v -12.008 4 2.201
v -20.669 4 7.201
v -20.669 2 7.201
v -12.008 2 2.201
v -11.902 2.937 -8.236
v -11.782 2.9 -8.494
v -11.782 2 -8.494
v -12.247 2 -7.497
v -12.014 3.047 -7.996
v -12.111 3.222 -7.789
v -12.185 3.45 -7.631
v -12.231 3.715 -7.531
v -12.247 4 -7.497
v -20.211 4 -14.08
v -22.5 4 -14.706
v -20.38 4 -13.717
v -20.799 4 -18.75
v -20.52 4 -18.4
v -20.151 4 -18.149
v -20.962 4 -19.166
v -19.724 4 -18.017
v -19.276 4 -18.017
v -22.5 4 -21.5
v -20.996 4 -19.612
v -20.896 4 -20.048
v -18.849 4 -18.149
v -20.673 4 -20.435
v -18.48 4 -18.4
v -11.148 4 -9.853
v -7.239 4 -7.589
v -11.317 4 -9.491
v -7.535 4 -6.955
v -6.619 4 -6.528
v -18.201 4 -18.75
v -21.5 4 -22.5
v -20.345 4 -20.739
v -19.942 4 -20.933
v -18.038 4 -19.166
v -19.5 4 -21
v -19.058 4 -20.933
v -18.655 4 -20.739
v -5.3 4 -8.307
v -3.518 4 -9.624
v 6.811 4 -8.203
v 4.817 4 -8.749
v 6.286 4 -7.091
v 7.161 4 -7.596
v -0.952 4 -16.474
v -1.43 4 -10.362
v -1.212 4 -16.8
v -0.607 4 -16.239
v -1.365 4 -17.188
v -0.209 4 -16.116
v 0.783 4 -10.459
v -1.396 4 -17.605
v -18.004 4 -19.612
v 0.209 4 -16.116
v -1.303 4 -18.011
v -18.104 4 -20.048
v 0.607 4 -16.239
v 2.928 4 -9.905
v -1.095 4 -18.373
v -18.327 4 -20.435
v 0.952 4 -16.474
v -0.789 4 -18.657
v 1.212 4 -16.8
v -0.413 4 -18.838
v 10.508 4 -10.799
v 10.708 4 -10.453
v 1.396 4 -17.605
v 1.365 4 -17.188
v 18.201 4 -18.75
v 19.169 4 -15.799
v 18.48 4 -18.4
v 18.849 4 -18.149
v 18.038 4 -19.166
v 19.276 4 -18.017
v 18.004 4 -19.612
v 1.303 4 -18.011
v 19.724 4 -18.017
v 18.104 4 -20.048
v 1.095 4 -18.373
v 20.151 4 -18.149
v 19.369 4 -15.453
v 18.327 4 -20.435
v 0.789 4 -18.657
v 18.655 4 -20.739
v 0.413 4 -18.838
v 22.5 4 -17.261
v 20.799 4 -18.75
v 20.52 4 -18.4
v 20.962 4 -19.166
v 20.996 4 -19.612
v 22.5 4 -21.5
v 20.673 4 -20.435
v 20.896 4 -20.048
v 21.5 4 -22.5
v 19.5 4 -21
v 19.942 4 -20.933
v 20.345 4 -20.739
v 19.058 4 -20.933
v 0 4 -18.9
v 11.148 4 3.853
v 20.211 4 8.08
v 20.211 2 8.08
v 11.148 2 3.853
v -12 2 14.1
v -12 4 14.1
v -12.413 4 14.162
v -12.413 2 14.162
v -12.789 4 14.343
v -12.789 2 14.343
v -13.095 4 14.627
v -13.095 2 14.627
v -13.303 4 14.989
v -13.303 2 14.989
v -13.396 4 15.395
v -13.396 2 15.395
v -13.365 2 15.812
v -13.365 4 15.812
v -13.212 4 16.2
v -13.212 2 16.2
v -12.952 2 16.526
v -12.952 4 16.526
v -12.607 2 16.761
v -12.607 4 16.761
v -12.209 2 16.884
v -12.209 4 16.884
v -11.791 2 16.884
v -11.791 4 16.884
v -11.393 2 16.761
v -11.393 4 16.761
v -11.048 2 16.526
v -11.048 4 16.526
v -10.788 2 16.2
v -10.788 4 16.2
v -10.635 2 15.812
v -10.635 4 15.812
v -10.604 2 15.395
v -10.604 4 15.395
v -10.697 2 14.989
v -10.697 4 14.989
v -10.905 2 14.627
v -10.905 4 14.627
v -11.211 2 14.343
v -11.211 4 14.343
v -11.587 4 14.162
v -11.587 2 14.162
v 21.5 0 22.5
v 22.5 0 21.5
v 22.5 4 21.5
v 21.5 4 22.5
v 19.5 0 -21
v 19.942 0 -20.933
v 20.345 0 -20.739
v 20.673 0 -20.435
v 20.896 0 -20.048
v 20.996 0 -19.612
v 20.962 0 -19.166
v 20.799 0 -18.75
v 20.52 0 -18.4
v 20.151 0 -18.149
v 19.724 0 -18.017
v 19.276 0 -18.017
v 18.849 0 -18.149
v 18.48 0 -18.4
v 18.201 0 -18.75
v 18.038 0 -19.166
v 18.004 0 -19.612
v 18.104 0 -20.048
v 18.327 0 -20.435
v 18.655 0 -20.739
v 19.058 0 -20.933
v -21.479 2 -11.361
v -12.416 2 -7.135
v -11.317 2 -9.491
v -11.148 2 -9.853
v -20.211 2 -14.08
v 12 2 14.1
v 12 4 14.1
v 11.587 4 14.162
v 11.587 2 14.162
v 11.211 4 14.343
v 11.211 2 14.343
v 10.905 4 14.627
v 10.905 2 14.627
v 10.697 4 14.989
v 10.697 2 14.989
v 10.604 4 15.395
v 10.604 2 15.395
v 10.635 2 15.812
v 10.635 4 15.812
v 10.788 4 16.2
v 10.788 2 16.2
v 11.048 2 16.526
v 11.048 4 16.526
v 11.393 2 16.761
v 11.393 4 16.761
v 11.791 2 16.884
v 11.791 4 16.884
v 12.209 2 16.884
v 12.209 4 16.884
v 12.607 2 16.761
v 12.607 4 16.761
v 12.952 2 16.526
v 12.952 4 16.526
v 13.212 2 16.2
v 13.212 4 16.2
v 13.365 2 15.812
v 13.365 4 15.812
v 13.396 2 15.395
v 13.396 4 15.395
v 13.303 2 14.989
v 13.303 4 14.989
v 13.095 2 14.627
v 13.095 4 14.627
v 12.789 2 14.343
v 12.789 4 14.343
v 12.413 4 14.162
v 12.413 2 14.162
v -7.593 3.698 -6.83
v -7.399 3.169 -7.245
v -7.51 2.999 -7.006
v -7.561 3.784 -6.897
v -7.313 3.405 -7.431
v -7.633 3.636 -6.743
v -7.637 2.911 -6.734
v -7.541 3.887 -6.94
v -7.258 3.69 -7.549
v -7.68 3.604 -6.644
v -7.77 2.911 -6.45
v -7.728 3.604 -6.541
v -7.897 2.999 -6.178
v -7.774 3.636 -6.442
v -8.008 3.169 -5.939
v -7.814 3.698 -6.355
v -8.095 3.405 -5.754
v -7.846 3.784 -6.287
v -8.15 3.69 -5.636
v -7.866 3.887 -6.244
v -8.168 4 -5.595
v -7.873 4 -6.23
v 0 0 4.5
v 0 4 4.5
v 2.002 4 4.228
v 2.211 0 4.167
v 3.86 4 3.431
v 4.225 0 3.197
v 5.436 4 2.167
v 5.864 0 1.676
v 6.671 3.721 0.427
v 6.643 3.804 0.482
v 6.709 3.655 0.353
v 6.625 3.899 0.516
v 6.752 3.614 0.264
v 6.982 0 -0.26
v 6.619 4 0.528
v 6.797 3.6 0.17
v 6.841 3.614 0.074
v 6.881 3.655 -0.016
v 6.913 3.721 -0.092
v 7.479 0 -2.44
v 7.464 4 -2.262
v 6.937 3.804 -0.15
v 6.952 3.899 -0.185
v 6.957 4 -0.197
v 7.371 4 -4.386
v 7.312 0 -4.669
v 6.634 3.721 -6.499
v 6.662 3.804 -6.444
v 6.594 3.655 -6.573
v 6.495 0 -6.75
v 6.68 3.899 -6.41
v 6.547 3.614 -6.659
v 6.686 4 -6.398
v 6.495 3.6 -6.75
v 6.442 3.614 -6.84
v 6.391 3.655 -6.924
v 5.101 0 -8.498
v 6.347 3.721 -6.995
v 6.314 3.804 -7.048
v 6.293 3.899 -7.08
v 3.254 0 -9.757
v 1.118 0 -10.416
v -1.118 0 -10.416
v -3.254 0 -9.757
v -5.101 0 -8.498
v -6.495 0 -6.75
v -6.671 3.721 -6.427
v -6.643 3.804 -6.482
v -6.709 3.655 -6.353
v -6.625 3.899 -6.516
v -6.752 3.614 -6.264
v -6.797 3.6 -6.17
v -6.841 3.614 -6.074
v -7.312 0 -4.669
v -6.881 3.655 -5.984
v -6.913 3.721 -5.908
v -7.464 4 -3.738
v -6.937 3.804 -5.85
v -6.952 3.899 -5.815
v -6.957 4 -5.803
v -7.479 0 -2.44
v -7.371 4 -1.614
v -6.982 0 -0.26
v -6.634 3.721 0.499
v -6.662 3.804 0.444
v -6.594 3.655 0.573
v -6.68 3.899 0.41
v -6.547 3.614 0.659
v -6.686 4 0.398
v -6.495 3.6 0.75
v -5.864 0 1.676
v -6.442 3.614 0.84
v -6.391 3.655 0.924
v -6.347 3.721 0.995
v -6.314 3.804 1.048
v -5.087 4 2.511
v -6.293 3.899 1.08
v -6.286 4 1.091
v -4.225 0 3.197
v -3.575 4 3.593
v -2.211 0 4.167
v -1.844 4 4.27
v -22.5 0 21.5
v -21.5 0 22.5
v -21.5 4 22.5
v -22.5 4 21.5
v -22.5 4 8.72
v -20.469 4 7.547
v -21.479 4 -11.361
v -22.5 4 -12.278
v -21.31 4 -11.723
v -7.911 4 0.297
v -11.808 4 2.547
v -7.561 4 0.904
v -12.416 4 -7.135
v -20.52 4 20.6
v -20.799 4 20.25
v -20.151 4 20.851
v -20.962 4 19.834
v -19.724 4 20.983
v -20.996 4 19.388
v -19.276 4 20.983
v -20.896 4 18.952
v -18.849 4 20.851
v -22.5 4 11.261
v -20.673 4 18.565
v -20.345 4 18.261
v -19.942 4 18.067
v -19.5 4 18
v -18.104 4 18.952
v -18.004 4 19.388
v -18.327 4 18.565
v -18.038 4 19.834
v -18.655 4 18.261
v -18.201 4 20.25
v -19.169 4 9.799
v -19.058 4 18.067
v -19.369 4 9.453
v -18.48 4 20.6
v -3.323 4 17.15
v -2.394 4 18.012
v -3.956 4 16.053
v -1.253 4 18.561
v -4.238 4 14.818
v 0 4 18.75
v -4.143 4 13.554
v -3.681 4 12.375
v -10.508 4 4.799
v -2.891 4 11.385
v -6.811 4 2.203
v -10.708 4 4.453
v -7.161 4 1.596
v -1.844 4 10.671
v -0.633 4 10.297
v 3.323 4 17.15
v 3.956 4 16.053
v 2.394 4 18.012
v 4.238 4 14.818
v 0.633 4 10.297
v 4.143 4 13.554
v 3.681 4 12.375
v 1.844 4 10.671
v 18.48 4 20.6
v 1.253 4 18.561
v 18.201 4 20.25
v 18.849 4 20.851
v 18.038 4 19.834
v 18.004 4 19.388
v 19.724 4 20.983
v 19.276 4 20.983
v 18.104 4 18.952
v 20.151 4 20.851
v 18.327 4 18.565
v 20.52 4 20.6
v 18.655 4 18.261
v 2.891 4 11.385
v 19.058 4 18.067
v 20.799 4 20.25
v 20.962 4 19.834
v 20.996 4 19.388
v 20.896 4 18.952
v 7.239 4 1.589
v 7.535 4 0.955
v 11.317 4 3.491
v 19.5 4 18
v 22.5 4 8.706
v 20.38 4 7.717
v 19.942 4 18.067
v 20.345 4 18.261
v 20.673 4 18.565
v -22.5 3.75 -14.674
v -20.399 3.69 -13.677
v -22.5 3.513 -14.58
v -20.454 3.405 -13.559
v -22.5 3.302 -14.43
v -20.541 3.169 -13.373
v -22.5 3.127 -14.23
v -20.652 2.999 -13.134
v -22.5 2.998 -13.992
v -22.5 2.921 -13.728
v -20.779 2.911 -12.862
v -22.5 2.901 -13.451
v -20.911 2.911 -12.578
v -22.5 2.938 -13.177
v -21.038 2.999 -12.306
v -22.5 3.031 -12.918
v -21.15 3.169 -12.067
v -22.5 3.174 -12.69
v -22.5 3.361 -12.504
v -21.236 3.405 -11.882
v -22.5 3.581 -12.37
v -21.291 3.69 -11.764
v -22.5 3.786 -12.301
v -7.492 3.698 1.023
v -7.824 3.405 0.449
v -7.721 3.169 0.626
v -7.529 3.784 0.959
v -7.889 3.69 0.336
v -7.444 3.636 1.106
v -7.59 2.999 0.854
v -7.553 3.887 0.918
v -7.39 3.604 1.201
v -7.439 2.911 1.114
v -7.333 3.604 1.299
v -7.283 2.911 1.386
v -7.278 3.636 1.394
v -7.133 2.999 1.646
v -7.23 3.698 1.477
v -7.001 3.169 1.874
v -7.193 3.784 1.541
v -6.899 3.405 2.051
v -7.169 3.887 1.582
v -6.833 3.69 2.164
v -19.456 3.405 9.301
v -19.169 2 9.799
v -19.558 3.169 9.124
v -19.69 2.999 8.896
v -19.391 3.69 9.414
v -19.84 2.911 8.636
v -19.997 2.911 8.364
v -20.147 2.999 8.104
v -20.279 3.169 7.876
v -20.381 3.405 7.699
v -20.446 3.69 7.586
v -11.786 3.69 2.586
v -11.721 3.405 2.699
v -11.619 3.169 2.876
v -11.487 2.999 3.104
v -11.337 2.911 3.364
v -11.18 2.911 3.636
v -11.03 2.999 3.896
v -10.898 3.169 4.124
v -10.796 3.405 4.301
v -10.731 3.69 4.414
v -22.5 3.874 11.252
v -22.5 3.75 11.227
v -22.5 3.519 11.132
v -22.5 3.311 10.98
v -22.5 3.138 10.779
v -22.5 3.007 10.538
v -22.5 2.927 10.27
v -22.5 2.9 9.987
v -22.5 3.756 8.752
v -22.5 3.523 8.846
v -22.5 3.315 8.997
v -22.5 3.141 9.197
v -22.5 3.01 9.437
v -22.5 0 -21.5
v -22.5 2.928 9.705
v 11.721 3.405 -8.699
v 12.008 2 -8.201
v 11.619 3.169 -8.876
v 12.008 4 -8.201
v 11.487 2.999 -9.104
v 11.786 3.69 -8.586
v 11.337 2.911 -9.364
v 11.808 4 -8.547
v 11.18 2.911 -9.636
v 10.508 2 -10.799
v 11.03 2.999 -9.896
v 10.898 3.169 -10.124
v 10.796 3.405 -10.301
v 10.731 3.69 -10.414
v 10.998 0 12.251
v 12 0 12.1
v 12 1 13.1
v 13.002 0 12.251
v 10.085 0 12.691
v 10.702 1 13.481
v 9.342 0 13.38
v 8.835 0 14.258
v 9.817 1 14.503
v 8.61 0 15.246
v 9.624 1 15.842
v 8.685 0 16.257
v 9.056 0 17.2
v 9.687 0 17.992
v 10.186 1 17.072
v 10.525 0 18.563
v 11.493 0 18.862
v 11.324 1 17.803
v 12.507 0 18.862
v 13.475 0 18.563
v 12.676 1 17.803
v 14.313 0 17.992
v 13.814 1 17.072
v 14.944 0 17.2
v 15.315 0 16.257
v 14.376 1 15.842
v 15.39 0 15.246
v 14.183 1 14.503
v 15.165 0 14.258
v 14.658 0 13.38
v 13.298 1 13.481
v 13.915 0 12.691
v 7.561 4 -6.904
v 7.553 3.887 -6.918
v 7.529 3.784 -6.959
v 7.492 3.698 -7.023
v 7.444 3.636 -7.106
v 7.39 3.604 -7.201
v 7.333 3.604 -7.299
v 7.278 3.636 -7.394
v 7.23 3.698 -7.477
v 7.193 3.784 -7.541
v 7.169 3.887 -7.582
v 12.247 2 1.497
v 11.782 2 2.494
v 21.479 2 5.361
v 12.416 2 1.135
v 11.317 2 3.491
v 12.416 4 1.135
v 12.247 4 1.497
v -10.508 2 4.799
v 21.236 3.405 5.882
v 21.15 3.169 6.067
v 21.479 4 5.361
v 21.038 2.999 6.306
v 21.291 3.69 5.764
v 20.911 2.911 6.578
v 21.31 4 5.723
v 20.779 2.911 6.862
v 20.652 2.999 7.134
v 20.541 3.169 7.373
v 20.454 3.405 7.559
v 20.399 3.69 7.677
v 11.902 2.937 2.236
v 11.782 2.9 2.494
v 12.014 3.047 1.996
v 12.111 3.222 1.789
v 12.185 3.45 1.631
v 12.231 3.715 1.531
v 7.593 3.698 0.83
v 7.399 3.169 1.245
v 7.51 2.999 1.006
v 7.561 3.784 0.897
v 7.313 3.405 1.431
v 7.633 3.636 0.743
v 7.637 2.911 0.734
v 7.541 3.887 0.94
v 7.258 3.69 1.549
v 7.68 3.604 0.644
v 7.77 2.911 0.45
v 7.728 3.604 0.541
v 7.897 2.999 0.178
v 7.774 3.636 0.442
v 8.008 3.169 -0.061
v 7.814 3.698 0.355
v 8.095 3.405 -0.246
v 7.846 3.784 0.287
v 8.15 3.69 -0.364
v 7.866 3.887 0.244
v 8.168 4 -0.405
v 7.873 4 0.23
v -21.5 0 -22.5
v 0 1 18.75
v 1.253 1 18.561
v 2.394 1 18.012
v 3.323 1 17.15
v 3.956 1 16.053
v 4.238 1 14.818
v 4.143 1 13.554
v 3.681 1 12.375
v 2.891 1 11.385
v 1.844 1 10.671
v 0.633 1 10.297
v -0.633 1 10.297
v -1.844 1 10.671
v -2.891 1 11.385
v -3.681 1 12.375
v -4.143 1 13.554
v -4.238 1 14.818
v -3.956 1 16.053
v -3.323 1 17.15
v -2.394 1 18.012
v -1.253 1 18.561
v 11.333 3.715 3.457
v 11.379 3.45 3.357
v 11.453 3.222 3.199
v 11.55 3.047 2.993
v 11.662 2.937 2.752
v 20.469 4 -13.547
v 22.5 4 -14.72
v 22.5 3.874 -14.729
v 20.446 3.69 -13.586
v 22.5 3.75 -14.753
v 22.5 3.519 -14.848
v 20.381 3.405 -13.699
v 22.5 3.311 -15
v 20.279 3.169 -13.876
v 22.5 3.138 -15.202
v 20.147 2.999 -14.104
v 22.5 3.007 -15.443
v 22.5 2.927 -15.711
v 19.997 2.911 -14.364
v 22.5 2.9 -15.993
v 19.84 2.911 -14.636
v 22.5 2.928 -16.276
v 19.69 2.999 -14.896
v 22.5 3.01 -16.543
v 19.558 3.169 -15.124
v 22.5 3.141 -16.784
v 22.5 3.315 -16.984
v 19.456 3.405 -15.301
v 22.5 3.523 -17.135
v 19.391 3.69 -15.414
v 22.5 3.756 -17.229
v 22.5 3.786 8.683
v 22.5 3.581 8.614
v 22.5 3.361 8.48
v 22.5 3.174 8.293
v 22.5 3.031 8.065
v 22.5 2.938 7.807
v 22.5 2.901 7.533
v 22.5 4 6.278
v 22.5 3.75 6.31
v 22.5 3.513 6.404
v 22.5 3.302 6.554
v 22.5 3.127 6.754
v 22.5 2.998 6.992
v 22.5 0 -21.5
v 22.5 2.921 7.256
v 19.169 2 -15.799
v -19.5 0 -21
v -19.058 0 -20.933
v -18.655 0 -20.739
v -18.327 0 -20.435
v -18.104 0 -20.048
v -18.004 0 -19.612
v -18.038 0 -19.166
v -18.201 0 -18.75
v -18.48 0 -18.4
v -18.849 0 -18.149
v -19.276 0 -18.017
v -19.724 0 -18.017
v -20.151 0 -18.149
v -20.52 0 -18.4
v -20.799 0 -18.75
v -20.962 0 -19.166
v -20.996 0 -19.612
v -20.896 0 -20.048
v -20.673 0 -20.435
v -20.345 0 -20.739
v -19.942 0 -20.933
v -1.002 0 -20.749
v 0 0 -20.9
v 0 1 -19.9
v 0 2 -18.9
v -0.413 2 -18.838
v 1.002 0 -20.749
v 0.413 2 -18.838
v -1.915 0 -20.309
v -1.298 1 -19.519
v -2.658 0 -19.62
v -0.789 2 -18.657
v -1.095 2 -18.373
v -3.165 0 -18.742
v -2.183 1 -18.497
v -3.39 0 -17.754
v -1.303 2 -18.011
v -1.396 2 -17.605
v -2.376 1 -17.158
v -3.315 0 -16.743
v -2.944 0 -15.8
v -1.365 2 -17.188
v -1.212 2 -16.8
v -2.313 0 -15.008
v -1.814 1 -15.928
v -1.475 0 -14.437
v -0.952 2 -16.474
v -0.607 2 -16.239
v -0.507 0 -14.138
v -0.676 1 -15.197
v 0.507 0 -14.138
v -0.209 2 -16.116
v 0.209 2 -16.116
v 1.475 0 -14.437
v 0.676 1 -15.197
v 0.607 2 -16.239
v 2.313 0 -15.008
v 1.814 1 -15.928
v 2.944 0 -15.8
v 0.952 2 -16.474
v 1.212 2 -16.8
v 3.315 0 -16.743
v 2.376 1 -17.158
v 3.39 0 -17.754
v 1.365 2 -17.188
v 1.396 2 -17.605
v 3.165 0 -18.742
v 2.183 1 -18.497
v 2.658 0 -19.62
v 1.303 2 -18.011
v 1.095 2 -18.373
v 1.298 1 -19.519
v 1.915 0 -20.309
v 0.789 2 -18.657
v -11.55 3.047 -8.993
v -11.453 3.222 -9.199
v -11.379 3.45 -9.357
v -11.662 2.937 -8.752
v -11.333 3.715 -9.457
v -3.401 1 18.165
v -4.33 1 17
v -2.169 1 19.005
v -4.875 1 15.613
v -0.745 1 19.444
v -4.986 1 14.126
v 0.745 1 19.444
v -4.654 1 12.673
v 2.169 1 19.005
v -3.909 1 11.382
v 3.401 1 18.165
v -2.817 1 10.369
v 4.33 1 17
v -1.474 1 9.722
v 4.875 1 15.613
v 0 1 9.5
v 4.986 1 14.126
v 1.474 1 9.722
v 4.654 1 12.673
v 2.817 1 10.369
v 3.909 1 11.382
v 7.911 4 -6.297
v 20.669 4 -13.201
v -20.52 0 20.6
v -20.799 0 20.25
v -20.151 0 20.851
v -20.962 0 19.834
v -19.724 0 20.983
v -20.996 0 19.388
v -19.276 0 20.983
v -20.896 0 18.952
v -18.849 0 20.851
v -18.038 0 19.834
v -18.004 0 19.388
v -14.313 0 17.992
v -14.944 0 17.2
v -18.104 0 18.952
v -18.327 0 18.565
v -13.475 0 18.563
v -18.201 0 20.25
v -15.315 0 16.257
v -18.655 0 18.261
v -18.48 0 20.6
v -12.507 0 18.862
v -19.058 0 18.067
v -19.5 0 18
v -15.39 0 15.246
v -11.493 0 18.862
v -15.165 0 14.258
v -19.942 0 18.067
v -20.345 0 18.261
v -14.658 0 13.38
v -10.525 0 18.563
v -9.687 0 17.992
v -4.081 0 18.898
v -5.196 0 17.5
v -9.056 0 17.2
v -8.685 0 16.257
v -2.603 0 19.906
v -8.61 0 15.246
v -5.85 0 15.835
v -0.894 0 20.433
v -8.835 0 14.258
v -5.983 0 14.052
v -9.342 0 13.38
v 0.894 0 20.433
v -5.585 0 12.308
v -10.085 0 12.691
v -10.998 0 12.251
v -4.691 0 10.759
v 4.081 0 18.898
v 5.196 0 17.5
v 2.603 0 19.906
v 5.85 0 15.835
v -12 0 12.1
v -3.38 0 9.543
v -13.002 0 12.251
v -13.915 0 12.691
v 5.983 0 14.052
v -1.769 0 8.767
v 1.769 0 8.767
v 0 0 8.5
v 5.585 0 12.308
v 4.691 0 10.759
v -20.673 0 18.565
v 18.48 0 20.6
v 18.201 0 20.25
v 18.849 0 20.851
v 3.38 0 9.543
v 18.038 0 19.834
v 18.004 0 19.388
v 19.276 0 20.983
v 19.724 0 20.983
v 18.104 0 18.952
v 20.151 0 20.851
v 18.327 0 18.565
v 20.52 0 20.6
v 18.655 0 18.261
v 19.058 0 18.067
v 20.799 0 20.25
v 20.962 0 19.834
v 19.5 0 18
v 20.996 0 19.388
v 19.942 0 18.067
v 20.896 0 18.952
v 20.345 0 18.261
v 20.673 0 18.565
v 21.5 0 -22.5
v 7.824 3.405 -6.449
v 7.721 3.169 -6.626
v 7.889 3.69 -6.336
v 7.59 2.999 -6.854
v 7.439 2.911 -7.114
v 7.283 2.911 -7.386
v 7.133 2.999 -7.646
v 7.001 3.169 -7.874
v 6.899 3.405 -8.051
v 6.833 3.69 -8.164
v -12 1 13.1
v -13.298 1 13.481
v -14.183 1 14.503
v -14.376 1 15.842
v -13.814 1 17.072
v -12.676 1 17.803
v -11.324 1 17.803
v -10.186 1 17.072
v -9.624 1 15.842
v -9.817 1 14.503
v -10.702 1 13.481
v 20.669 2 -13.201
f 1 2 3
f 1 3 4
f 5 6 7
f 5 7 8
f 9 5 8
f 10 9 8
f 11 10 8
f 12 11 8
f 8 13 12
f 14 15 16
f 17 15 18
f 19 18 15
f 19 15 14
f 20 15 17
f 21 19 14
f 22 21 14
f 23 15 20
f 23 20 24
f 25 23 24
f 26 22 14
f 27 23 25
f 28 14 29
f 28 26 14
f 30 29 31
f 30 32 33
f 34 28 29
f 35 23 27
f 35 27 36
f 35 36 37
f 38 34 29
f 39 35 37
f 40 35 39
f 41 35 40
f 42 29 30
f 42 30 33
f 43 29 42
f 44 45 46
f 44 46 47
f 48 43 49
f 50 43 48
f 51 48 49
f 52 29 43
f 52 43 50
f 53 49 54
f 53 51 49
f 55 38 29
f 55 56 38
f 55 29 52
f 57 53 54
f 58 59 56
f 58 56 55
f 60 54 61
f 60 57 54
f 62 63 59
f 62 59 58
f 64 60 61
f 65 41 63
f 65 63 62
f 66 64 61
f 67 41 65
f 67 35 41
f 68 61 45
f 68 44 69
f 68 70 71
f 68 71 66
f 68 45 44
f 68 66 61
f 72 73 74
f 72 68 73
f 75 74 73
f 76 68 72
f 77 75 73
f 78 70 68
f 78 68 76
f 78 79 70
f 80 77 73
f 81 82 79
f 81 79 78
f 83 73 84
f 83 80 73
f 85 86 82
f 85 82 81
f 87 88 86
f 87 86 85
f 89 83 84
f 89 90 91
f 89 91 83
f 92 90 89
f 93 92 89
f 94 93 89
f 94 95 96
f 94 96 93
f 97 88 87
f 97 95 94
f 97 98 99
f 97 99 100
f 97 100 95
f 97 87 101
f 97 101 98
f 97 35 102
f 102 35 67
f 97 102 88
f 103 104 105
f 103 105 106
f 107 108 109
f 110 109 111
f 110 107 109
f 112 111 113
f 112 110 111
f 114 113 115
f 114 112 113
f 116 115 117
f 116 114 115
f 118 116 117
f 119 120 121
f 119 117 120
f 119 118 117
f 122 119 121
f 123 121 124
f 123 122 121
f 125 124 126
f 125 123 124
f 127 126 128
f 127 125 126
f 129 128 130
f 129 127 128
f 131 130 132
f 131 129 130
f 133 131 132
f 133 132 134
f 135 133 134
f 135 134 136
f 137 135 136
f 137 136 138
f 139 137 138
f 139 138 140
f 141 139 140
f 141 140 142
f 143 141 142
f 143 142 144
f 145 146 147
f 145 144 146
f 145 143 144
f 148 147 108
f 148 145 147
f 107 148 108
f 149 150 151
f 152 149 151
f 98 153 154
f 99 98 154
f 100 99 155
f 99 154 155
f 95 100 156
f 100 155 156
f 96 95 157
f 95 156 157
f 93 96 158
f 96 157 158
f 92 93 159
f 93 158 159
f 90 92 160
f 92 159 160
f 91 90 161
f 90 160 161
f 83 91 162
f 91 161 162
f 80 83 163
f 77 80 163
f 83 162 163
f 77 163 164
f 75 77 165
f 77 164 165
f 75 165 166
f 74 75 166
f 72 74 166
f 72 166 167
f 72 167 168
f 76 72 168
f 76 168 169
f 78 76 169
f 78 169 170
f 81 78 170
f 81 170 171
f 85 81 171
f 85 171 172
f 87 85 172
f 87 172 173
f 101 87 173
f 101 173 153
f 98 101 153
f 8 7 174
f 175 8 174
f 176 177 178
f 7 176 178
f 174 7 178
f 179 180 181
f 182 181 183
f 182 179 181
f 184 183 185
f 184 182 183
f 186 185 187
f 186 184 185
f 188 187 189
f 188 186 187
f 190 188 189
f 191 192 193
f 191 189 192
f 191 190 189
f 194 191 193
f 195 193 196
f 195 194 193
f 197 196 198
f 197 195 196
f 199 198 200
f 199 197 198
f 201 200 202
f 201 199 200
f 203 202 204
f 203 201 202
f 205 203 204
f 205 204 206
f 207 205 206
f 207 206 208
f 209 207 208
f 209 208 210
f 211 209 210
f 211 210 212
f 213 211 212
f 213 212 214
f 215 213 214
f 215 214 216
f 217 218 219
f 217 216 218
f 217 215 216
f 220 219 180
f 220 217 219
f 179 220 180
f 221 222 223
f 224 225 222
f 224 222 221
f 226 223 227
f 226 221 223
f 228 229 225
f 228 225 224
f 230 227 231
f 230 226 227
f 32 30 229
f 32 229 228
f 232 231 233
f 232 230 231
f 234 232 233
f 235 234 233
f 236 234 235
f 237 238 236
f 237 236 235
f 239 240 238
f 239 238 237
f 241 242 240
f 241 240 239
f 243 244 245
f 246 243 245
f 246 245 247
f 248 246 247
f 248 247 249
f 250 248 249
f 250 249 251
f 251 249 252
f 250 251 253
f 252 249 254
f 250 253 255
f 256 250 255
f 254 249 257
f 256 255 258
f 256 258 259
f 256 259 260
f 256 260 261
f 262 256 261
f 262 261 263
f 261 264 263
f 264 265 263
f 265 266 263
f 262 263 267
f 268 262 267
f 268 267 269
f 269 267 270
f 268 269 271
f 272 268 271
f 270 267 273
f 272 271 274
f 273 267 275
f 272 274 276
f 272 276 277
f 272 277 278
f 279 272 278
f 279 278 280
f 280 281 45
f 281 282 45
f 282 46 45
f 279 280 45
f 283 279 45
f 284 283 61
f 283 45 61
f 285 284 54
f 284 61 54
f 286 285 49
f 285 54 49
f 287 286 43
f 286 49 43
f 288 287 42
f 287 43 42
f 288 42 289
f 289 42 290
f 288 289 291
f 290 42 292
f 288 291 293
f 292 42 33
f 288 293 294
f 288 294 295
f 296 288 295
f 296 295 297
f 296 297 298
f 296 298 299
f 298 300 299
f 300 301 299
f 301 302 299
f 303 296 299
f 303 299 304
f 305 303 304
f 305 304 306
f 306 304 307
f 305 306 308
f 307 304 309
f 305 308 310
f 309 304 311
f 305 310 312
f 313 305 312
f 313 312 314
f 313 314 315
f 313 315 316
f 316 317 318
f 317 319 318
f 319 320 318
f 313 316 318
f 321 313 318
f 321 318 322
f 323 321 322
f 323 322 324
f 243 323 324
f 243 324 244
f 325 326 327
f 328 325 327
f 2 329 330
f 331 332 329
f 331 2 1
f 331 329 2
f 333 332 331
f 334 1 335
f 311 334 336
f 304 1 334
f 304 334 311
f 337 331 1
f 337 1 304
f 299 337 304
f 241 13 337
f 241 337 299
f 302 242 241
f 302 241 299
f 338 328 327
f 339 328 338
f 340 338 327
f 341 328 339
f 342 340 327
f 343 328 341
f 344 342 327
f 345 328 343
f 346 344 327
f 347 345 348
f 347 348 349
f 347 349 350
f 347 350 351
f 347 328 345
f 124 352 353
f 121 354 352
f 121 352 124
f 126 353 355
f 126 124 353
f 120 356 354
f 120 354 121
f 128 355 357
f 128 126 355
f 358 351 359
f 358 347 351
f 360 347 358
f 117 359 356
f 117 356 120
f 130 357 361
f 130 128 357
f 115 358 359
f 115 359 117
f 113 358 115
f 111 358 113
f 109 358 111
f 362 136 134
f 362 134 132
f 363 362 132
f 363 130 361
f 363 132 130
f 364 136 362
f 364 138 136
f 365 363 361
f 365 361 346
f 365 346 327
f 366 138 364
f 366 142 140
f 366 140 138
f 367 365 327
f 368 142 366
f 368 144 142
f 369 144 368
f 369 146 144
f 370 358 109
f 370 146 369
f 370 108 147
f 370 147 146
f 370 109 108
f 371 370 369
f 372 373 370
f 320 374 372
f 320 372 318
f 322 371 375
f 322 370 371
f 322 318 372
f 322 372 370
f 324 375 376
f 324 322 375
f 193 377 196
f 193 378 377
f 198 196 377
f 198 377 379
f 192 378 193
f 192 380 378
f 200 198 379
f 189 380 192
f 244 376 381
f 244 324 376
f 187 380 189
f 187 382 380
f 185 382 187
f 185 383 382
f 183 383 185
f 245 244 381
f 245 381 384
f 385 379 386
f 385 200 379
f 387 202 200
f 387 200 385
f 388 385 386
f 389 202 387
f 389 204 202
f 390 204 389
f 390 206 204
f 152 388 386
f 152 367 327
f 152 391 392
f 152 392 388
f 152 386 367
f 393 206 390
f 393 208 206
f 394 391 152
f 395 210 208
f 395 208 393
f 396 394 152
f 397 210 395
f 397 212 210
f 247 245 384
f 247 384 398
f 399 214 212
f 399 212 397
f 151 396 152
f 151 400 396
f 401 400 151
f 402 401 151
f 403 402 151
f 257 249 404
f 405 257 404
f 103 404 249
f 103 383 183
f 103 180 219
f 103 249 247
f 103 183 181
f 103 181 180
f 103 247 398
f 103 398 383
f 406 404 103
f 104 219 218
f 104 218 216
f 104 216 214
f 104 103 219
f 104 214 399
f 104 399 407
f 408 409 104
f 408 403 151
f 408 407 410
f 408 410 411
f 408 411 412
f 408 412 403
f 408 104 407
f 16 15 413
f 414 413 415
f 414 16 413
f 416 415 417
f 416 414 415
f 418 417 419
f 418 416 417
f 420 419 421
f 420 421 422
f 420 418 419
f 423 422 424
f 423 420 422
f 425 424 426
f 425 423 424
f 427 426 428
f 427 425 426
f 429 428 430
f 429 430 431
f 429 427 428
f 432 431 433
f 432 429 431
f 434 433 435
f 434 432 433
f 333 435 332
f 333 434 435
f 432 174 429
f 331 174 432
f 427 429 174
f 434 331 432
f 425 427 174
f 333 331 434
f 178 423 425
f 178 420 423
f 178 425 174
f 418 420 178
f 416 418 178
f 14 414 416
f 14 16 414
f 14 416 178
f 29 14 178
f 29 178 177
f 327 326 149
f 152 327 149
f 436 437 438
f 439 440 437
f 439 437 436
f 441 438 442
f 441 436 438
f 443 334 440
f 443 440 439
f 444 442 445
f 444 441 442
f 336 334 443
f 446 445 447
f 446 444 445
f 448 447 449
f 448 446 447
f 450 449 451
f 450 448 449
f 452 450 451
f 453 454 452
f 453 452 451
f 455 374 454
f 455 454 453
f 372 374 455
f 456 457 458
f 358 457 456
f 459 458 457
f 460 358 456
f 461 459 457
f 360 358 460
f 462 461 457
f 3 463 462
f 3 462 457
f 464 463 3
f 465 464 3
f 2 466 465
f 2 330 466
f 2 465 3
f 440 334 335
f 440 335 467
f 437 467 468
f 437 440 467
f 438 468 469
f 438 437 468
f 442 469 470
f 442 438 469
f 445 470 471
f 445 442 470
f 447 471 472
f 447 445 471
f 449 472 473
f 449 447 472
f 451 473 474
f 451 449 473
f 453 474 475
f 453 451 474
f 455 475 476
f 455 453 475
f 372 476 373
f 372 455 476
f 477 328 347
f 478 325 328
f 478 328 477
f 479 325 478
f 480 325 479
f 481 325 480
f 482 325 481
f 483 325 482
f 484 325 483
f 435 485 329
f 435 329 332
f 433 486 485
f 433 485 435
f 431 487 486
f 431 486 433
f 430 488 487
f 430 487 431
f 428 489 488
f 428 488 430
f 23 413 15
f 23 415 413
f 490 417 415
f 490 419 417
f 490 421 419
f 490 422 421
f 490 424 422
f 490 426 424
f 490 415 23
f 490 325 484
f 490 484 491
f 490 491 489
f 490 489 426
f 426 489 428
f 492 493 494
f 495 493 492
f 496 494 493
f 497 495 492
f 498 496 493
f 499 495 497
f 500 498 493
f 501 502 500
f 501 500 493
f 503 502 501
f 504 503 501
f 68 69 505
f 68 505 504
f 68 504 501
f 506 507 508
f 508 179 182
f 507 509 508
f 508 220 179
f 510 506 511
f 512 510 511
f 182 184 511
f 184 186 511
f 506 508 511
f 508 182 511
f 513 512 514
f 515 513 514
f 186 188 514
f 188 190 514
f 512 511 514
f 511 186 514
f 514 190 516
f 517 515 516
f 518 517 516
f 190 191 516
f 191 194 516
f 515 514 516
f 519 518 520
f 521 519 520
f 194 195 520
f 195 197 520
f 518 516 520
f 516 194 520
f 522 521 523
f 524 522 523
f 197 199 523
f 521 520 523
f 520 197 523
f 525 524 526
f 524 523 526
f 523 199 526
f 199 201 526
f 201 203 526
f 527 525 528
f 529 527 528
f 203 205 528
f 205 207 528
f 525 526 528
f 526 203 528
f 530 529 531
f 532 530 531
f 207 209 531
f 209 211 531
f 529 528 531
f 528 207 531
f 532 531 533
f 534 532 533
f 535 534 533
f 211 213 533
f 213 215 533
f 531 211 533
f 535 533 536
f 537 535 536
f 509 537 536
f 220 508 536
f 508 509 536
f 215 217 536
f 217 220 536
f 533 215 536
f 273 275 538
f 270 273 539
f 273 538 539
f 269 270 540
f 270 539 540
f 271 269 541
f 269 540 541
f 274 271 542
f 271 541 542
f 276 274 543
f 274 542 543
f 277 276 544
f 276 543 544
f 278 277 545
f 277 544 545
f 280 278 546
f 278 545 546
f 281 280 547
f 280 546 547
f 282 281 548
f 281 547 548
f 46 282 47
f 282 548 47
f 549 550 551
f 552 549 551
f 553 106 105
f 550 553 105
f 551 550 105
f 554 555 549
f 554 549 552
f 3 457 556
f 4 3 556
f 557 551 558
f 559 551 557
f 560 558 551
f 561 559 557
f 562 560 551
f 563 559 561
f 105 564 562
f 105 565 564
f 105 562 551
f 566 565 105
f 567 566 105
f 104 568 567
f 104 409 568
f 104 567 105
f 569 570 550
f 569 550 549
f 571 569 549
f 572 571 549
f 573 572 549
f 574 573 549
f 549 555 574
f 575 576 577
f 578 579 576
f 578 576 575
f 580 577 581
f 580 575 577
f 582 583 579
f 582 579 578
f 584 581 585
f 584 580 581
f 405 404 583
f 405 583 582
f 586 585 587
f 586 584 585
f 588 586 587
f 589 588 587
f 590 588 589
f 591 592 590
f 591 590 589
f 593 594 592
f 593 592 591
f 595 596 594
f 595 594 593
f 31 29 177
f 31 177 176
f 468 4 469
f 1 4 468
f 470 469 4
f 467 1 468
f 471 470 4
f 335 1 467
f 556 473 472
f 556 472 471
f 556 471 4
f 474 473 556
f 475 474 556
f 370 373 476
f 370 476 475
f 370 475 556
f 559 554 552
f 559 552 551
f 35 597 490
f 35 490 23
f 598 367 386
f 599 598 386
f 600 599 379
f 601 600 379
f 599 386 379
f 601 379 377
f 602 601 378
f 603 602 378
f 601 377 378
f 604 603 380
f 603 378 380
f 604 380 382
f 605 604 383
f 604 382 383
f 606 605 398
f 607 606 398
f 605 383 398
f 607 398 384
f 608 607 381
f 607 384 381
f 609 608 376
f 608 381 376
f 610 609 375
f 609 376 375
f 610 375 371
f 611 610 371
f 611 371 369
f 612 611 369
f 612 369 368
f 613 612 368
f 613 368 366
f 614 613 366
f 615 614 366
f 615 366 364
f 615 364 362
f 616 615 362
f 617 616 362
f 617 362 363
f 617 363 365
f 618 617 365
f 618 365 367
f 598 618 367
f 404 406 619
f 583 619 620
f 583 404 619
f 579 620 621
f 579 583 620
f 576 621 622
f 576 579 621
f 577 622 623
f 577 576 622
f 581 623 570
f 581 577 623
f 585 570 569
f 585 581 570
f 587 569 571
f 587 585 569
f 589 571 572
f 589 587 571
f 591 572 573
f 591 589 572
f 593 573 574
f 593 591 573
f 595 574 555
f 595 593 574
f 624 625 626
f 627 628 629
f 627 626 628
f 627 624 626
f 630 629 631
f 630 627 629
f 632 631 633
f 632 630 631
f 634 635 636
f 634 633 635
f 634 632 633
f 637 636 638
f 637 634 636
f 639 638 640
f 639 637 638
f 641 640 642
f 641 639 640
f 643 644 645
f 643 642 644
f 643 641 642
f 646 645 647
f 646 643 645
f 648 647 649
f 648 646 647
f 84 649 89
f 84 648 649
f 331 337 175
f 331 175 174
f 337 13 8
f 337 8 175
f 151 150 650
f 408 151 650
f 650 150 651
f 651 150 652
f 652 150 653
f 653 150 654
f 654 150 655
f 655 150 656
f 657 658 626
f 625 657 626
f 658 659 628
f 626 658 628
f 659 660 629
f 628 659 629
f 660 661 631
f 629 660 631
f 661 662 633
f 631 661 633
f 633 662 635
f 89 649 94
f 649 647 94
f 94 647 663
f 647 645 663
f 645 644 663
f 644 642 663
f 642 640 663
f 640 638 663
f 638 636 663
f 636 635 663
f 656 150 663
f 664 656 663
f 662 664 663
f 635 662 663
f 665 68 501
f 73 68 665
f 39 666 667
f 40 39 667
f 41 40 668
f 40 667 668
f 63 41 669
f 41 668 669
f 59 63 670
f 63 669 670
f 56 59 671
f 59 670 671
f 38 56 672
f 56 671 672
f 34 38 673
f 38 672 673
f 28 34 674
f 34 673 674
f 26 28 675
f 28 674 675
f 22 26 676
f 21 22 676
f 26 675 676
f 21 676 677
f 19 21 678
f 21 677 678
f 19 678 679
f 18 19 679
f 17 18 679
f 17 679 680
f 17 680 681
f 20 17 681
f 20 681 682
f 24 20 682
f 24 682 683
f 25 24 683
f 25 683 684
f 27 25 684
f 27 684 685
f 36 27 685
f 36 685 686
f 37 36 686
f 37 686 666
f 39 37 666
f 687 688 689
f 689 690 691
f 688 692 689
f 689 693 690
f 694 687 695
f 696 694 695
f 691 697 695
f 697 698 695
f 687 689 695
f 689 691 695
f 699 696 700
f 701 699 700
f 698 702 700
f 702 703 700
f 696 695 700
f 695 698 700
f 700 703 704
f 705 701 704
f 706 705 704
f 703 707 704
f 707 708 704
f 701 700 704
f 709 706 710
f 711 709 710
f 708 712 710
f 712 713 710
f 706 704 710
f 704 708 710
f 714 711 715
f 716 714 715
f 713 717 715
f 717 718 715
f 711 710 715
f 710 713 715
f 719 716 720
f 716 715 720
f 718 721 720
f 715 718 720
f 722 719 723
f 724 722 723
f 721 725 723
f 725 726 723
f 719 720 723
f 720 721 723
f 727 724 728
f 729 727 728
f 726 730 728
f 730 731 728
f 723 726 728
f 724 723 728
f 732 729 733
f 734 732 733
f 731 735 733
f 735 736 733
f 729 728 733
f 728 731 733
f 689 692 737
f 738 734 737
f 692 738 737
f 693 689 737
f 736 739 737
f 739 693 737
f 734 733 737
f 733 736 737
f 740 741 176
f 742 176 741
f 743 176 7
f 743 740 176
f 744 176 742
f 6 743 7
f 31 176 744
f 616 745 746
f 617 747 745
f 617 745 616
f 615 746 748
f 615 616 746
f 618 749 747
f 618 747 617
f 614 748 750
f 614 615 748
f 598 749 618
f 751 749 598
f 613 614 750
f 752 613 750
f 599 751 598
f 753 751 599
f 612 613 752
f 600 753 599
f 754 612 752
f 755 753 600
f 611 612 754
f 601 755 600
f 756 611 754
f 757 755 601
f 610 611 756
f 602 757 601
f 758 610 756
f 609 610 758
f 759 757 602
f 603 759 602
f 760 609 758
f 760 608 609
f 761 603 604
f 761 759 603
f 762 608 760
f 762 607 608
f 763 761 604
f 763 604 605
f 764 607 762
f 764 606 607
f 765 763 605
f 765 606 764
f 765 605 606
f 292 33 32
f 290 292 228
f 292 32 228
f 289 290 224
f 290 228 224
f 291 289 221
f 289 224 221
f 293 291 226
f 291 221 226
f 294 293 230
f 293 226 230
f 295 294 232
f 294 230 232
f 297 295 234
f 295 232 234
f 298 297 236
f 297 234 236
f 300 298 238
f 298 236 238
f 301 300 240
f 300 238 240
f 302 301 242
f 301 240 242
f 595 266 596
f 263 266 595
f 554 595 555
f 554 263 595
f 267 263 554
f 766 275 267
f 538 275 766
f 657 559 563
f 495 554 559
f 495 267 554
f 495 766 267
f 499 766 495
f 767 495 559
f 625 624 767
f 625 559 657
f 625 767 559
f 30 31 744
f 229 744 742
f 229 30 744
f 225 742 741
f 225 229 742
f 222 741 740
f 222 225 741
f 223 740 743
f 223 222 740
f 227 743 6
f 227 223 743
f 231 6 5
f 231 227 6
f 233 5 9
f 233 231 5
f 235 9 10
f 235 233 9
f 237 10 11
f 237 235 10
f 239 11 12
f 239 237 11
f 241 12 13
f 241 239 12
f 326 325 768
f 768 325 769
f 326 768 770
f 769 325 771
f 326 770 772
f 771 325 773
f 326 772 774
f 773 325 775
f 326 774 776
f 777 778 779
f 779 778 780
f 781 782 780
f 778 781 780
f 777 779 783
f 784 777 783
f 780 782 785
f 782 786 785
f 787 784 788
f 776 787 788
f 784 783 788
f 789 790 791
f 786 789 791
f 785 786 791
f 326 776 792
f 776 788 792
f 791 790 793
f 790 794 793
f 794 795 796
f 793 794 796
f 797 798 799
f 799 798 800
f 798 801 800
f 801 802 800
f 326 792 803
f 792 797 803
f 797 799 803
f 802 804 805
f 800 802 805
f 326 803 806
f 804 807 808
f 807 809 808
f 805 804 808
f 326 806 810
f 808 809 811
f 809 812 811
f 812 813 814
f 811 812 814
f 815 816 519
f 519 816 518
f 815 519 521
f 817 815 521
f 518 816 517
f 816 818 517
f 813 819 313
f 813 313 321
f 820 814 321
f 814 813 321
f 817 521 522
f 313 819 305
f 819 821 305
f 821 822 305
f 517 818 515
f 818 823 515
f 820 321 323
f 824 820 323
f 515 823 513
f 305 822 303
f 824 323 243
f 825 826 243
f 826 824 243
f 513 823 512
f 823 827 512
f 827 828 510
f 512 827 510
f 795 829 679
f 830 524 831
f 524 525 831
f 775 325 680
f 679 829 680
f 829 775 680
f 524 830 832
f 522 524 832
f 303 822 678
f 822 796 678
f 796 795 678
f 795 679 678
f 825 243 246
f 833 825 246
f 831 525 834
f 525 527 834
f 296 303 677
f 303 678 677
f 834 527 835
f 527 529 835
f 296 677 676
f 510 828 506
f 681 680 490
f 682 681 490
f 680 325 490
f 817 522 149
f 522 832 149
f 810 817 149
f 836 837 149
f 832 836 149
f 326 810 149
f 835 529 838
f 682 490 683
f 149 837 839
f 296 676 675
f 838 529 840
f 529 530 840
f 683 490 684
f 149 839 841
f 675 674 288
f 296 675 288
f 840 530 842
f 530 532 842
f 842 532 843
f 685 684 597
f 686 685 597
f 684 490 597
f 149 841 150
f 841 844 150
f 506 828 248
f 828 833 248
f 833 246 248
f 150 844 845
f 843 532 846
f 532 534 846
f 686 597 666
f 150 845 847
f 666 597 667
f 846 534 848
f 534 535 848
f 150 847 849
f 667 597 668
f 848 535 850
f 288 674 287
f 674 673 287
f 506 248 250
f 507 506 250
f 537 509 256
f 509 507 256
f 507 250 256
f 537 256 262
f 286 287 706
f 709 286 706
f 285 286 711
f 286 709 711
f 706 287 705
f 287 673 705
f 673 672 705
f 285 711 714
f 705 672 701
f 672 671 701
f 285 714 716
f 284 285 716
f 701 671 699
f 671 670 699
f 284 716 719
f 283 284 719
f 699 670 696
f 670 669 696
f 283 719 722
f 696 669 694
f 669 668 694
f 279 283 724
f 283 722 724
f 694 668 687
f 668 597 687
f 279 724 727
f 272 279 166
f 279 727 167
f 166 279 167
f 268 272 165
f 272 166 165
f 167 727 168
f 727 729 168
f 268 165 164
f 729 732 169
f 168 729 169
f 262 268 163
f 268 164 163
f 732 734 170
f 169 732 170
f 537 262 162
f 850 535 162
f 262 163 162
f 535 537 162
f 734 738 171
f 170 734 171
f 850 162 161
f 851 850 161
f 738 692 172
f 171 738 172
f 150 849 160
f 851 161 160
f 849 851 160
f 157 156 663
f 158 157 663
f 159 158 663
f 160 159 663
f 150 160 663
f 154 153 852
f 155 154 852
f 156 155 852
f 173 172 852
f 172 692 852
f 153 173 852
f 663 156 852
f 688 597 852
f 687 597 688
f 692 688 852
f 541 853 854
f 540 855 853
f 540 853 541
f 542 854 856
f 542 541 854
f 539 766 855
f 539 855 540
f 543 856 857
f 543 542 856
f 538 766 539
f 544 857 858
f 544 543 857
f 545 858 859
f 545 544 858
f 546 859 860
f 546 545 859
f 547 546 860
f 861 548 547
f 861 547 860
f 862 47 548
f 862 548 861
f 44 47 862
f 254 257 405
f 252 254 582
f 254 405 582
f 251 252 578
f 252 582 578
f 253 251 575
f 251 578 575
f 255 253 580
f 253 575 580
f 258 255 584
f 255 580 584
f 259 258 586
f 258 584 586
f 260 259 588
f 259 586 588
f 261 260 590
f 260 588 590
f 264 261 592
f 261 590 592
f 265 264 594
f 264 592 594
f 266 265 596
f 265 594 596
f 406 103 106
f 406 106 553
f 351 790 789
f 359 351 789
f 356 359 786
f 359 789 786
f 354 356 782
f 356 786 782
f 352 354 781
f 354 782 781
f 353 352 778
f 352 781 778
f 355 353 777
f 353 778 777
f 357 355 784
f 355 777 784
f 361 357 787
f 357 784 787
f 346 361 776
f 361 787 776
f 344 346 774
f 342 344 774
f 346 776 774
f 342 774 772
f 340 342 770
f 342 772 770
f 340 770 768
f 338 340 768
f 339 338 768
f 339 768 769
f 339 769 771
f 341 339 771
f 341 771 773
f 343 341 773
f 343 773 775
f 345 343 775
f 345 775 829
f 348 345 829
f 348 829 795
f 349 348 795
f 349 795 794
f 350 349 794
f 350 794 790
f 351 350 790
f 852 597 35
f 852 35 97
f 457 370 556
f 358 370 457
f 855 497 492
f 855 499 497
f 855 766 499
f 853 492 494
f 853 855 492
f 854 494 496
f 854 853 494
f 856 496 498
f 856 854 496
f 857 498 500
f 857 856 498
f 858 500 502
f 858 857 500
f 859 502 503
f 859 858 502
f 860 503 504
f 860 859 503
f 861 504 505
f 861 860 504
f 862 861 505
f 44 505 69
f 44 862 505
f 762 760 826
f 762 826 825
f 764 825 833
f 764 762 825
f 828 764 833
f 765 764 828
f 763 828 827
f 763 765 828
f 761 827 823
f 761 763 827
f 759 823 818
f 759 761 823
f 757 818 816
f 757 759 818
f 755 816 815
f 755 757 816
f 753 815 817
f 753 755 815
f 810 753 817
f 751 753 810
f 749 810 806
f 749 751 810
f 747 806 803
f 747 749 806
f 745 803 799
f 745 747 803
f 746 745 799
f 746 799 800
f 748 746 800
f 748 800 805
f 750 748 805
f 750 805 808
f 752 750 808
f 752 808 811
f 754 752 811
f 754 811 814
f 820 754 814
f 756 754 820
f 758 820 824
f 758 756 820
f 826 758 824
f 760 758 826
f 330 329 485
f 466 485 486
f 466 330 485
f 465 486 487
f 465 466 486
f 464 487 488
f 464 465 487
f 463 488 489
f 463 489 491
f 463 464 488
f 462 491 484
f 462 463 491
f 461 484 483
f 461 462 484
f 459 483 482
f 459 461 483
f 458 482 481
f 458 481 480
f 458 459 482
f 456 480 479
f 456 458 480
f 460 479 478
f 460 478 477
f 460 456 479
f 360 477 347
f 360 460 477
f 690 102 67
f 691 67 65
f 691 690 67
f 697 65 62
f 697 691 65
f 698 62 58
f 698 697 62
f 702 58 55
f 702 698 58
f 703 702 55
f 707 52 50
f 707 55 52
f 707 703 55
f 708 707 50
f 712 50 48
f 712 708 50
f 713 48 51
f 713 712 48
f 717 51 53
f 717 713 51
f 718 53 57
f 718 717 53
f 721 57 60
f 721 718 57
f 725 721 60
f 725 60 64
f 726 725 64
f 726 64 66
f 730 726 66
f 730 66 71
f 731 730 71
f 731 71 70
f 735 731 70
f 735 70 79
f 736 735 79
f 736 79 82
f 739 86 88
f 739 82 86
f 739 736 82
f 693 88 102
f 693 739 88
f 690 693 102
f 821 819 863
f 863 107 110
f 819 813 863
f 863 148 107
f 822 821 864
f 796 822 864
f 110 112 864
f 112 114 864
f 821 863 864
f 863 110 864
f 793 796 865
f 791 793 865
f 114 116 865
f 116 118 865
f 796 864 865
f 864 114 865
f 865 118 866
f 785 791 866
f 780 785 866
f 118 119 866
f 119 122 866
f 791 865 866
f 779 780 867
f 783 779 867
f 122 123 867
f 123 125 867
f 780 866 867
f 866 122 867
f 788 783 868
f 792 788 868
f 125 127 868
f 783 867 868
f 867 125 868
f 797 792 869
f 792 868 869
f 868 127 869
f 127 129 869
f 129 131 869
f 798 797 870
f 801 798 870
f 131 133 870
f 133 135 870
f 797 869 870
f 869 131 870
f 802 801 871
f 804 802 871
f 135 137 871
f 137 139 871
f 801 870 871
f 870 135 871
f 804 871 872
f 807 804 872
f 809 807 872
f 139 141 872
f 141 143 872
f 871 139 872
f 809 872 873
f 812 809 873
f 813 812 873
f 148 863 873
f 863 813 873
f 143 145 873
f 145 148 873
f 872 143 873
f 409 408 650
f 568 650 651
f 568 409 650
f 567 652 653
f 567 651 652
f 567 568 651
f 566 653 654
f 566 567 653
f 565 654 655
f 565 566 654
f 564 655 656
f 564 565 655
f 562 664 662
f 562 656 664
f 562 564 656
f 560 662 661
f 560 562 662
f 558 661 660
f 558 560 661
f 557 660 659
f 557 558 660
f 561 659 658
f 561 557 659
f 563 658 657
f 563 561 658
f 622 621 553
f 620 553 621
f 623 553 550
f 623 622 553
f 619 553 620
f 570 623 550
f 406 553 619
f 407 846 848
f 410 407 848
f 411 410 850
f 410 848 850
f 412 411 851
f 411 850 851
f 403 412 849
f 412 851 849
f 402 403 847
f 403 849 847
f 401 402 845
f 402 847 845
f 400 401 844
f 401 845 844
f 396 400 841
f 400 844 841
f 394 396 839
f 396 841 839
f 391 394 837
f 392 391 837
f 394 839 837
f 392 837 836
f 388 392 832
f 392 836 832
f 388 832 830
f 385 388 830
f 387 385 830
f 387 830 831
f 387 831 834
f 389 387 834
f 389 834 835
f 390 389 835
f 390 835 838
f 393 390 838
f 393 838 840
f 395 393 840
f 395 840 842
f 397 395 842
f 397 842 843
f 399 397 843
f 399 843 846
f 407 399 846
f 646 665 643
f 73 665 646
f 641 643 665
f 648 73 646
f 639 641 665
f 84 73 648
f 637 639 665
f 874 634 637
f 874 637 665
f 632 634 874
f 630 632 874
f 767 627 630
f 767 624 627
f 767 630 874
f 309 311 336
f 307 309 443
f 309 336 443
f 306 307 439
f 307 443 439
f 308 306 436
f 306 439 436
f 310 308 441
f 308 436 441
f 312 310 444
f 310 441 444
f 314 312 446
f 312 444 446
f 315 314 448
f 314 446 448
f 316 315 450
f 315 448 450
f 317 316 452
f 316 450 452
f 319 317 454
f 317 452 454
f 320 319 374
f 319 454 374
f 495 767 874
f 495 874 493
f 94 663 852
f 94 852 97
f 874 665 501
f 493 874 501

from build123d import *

# Parameters (mm, degrees)
SKETCH_1_W               = 45
SKETCH_1_H               = 45
EXTRUDE_1_DEPTH          = 4
SKETCH_2_R               = 7.5
CUT_EXTRUDE_1_DEPTH      = 33.070235422
CUT_EXTRUDE_START        = -4.5
SKETCH_4_R               = 1.1
CUT_EXTRUDE_3_DEPTH      = 51.888424881
SKETCH_10_R              = 0.4
CUT_EXTRUDE_9_DEPTH      = 2
SKETCH_7_R               = 1.1
CUT_EXTRUDE_5_DEPTH      = 52.18645266
SKETCH_11_R              = 0.4
CUT_EXTRUDE_10_DEPTH     = 2
CUT_EXTRUDE_4_DEPTH      = 2
PATTERN_CIRCULAR_1_COUNT = 2
SKETCH_6_R               = 1.5
CUT_EXTRUDE_6_DEPTH      = 33.070235434
SKETCH_8_R               = 4.25
CUT_EXTRUDE_7_DEPTH      = 33.070235434
SKETCH_9_R               = 6
CUT_EXTRUDE_8_DEPTH      = 1
SKETCH_12_R              = 1.4
CUT_EXTRUDE_11_DEPTH     = 33.070235434
CHAMFER_1_SIZE           = 1
CHAMFER_2_SIZE           = 1
CHAMFER_3_SIZE           = 2


with BuildPart() as part:
    # 草图1 → 凸台-拉伸1 (new body)
    with BuildSketch(Plane(origin=(0, 0, 0), x_dir=(1, 0, 0), z_dir=(0, 1, 0))):
        Rectangle(SKETCH_1_W, SKETCH_1_H)
    extrude(amount=EXTRUDE_1_DEPTH)

    # 草图2 → 切除-拉伸1 (cut, through all)
    with BuildSketch(Plane(origin=(0, 4, 0), x_dir=(1, 0, 0), z_dir=(0, 1, 0))):
        with Locations(Location((0, 3, 0), (0, 0, 270))):
            Circle(SKETCH_2_R)
    extrude(amount=-CUT_EXTRUDE_1_DEPTH, mode=Mode.SUBTRACT)

    # 草图4 → 切除-拉伸3 (cut)
    with BuildSketch(Plane(origin=(-11.782001231, 4, -8.494037403), x_dir=(-0.4226182617407036, 0, 0.9063077870366482), z_dir=(-0.9063077870366482, 0, -0.4226182617407036)).offset(CUT_EXTRUDE_START)):
        Circle(SKETCH_4_R)
    cut_extrude_3 = extrude(amount=CUT_EXTRUDE_3_DEPTH, mode=Mode.SUBTRACT)

    # 草图10 → 切除-拉伸9 (cut)
    with BuildSketch(Plane(origin=(-8.852682854, 0, -4.12807381), x_dir=(-0.4226182617407035, 0, 0.906307787036648), z_dir=(-0.906307787036648, 0, -0.4226182617407035))):
        with Locations((-2.718923361, 4)):
            Circle(SKETCH_10_R)
    cut_extrude_9 = extrude(amount=-CUT_EXTRUDE_9_DEPTH, mode=Mode.SUBTRACT)

    # 草图7 → 切除-拉伸5 (cut)
    with BuildSketch(Plane(origin=(11.258330249, 4, -9.5), x_dir=(-0.5000000000000042, 0, -0.8660254037844363), z_dir=(0.8660254037844363, 0, -0.5000000000000042)).offset(CUT_EXTRUDE_START)):
        Circle(SKETCH_7_R)
    cut_extrude_5 = extrude(amount=CUT_EXTRUDE_5_DEPTH, mode=Mode.SUBTRACT)

    # 草图11 → 切除-拉伸10 (cut)
    with BuildSketch(Plane(origin=(8.660254038, 0, -5), x_dir=(-0.5000000000000042, 0, -0.8660254037844363), z_dir=(0.8660254037844363, 0, -0.5000000000000042))):
        with Locations((2.598076211, 4)):
            Circle(SKETCH_11_R)
    cut_extrude_10 = extrude(amount=-CUT_EXTRUDE_10_DEPTH, mode=Mode.SUBTRACT)

    # 草图5 → 切除-拉伸4 (cut)
    with BuildSketch(Plane(origin=(0, 4, 0), x_dir=(1, 0, 0), z_dir=(0, 1, 0))):
        Polygon((-11.782001231, 8.494037403), (-12.246881319, 7.497098837), (-12.415928624, 7.134575722), (-21.479006494, 11.360758339), (-20.211151709, 14.079681701), (-11.148073839, 9.853499083), (-11.317121144, 9.490975968), align=None)
        Polygon((12.008330249, 8.200961894), (10.508330249, 10.799038106), (19.168584287, 15.799038106), (20.668584287, 13.200961894), align=None)
    cut_extrude_4 = extrude(amount=-CUT_EXTRUDE_4_DEPTH, mode=Mode.SUBTRACT)

    # 阵列(圆周)1: 切除-拉伸3, 切除-拉伸9, 切除-拉伸5, 切除-拉伸10, 切除-拉伸4 ×2 about axis
    pattern_circular_1_axis = Axis((0, 0, -3), (0, 1, 0))
    add([cut_extrude_3.rotate(pattern_circular_1_axis, i * 360 / PATTERN_CIRCULAR_1_COUNT) for i in range(1, PATTERN_CIRCULAR_1_COUNT)], mode=Mode.SUBTRACT)
    add([cut_extrude_9.rotate(pattern_circular_1_axis, i * 360 / PATTERN_CIRCULAR_1_COUNT) for i in range(1, PATTERN_CIRCULAR_1_COUNT)], mode=Mode.SUBTRACT)
    add([cut_extrude_5.rotate(pattern_circular_1_axis, i * 360 / PATTERN_CIRCULAR_1_COUNT) for i in range(1, PATTERN_CIRCULAR_1_COUNT)], mode=Mode.SUBTRACT)
    add([cut_extrude_10.rotate(pattern_circular_1_axis, i * 360 / PATTERN_CIRCULAR_1_COUNT) for i in range(1, PATTERN_CIRCULAR_1_COUNT)], mode=Mode.SUBTRACT)
    add([cut_extrude_4.rotate(pattern_circular_1_axis, i * 360 / PATTERN_CIRCULAR_1_COUNT) for i in range(1, PATTERN_CIRCULAR_1_COUNT)], mode=Mode.SUBTRACT)

    # 草图6 → 切除-拉伸6 (cut, through all)
    with BuildSketch(Plane.XZ):
        with Locations(Location((19.5, -19.5, 0), (0, 0, 270))):
            Circle(SKETCH_6_R)
        with Locations(Location((-19.5, -19.5, 0), (0, 0, 270))):
            Circle(SKETCH_6_R)
        with Locations(Location((-19.5, 19.5, 0), (0, 0, 270))):
            Circle(SKETCH_6_R)
        with Locations(Location((19.5, 19.5, 0), (0, 0, 270))):
            Circle(SKETCH_6_R)
    extrude(amount=-CUT_EXTRUDE_6_DEPTH, mode=Mode.SUBTRACT)

    # 草图8 → 切除-拉伸7 (cut, through all)
    with BuildSketch(Plane(origin=(0, 4, 0), x_dir=(1, 0, 0), z_dir=(0, 1, 0))):
        with Locations(Location((0, -14.5, 0), (0, 0, 270))):
            Circle(SKETCH_8_R)
    extrude(amount=-CUT_EXTRUDE_7_DEPTH, mode=Mode.SUBTRACT)

    # 草图9 → 切除-拉伸8 (cut)
    with BuildSketch(Plane.XZ):
        with Locations(Location((0, 14.5, 0), (0, 0, 270))):
            Circle(SKETCH_9_R)
    extrude(amount=-CUT_EXTRUDE_8_DEPTH, mode=Mode.SUBTRACT)

    # 草图12 → 切除-拉伸11 (cut, through all)
    with BuildSketch(Plane(origin=(0, 0, 0), x_dir=(1, 0, 0), z_dir=(0, 1, 0))):
        with Locations(Location((0, 17.5, 0), (0, 0, 90))):
            Circle(SKETCH_12_R)
        with Locations(Location((-12, -15.5, 0), (0, 0, 90))):
            Circle(SKETCH_12_R)
        with Locations(Location((12, -15.5, 0), (0, 0, 90))):
            Circle(SKETCH_12_R)
    extrude(amount=CUT_EXTRUDE_11_DEPTH, mode=Mode.SUBTRACT)

    # 倒角1
    chamfer_1_edges = [part.edges().sort_by_distance(p)[0] for p in [
        (0, 1, 20.5),
    ]]
    chamfer(chamfer_1_edges, length=CHAMFER_1_SIZE - 0.0001)  # a hair under: the kernel refuses the full size

    # 倒角2
    chamfer_2_edges = [part.edges().sort_by_distance(p)[0] for p in [
        (22.5, 2, 22.5),
        (-22.5, 2, 22.5),
        (-22.5, 2, -22.5),
        (22.5, 2, -22.5),
    ]]
    chamfer(chamfer_2_edges, length=CHAMFER_2_SIZE)

    # 倒角3
    chamfer_3_edges = [part.edges().sort_by_distance(p)[0] for p in [
        (0, 0, -16.1),
        (-12, 0, 16.9),
        (12, 0, 16.9),
    ]]
    chamfer(chamfer_3_edges, length=CHAMFER_3_SIZE)


solid = part.part
